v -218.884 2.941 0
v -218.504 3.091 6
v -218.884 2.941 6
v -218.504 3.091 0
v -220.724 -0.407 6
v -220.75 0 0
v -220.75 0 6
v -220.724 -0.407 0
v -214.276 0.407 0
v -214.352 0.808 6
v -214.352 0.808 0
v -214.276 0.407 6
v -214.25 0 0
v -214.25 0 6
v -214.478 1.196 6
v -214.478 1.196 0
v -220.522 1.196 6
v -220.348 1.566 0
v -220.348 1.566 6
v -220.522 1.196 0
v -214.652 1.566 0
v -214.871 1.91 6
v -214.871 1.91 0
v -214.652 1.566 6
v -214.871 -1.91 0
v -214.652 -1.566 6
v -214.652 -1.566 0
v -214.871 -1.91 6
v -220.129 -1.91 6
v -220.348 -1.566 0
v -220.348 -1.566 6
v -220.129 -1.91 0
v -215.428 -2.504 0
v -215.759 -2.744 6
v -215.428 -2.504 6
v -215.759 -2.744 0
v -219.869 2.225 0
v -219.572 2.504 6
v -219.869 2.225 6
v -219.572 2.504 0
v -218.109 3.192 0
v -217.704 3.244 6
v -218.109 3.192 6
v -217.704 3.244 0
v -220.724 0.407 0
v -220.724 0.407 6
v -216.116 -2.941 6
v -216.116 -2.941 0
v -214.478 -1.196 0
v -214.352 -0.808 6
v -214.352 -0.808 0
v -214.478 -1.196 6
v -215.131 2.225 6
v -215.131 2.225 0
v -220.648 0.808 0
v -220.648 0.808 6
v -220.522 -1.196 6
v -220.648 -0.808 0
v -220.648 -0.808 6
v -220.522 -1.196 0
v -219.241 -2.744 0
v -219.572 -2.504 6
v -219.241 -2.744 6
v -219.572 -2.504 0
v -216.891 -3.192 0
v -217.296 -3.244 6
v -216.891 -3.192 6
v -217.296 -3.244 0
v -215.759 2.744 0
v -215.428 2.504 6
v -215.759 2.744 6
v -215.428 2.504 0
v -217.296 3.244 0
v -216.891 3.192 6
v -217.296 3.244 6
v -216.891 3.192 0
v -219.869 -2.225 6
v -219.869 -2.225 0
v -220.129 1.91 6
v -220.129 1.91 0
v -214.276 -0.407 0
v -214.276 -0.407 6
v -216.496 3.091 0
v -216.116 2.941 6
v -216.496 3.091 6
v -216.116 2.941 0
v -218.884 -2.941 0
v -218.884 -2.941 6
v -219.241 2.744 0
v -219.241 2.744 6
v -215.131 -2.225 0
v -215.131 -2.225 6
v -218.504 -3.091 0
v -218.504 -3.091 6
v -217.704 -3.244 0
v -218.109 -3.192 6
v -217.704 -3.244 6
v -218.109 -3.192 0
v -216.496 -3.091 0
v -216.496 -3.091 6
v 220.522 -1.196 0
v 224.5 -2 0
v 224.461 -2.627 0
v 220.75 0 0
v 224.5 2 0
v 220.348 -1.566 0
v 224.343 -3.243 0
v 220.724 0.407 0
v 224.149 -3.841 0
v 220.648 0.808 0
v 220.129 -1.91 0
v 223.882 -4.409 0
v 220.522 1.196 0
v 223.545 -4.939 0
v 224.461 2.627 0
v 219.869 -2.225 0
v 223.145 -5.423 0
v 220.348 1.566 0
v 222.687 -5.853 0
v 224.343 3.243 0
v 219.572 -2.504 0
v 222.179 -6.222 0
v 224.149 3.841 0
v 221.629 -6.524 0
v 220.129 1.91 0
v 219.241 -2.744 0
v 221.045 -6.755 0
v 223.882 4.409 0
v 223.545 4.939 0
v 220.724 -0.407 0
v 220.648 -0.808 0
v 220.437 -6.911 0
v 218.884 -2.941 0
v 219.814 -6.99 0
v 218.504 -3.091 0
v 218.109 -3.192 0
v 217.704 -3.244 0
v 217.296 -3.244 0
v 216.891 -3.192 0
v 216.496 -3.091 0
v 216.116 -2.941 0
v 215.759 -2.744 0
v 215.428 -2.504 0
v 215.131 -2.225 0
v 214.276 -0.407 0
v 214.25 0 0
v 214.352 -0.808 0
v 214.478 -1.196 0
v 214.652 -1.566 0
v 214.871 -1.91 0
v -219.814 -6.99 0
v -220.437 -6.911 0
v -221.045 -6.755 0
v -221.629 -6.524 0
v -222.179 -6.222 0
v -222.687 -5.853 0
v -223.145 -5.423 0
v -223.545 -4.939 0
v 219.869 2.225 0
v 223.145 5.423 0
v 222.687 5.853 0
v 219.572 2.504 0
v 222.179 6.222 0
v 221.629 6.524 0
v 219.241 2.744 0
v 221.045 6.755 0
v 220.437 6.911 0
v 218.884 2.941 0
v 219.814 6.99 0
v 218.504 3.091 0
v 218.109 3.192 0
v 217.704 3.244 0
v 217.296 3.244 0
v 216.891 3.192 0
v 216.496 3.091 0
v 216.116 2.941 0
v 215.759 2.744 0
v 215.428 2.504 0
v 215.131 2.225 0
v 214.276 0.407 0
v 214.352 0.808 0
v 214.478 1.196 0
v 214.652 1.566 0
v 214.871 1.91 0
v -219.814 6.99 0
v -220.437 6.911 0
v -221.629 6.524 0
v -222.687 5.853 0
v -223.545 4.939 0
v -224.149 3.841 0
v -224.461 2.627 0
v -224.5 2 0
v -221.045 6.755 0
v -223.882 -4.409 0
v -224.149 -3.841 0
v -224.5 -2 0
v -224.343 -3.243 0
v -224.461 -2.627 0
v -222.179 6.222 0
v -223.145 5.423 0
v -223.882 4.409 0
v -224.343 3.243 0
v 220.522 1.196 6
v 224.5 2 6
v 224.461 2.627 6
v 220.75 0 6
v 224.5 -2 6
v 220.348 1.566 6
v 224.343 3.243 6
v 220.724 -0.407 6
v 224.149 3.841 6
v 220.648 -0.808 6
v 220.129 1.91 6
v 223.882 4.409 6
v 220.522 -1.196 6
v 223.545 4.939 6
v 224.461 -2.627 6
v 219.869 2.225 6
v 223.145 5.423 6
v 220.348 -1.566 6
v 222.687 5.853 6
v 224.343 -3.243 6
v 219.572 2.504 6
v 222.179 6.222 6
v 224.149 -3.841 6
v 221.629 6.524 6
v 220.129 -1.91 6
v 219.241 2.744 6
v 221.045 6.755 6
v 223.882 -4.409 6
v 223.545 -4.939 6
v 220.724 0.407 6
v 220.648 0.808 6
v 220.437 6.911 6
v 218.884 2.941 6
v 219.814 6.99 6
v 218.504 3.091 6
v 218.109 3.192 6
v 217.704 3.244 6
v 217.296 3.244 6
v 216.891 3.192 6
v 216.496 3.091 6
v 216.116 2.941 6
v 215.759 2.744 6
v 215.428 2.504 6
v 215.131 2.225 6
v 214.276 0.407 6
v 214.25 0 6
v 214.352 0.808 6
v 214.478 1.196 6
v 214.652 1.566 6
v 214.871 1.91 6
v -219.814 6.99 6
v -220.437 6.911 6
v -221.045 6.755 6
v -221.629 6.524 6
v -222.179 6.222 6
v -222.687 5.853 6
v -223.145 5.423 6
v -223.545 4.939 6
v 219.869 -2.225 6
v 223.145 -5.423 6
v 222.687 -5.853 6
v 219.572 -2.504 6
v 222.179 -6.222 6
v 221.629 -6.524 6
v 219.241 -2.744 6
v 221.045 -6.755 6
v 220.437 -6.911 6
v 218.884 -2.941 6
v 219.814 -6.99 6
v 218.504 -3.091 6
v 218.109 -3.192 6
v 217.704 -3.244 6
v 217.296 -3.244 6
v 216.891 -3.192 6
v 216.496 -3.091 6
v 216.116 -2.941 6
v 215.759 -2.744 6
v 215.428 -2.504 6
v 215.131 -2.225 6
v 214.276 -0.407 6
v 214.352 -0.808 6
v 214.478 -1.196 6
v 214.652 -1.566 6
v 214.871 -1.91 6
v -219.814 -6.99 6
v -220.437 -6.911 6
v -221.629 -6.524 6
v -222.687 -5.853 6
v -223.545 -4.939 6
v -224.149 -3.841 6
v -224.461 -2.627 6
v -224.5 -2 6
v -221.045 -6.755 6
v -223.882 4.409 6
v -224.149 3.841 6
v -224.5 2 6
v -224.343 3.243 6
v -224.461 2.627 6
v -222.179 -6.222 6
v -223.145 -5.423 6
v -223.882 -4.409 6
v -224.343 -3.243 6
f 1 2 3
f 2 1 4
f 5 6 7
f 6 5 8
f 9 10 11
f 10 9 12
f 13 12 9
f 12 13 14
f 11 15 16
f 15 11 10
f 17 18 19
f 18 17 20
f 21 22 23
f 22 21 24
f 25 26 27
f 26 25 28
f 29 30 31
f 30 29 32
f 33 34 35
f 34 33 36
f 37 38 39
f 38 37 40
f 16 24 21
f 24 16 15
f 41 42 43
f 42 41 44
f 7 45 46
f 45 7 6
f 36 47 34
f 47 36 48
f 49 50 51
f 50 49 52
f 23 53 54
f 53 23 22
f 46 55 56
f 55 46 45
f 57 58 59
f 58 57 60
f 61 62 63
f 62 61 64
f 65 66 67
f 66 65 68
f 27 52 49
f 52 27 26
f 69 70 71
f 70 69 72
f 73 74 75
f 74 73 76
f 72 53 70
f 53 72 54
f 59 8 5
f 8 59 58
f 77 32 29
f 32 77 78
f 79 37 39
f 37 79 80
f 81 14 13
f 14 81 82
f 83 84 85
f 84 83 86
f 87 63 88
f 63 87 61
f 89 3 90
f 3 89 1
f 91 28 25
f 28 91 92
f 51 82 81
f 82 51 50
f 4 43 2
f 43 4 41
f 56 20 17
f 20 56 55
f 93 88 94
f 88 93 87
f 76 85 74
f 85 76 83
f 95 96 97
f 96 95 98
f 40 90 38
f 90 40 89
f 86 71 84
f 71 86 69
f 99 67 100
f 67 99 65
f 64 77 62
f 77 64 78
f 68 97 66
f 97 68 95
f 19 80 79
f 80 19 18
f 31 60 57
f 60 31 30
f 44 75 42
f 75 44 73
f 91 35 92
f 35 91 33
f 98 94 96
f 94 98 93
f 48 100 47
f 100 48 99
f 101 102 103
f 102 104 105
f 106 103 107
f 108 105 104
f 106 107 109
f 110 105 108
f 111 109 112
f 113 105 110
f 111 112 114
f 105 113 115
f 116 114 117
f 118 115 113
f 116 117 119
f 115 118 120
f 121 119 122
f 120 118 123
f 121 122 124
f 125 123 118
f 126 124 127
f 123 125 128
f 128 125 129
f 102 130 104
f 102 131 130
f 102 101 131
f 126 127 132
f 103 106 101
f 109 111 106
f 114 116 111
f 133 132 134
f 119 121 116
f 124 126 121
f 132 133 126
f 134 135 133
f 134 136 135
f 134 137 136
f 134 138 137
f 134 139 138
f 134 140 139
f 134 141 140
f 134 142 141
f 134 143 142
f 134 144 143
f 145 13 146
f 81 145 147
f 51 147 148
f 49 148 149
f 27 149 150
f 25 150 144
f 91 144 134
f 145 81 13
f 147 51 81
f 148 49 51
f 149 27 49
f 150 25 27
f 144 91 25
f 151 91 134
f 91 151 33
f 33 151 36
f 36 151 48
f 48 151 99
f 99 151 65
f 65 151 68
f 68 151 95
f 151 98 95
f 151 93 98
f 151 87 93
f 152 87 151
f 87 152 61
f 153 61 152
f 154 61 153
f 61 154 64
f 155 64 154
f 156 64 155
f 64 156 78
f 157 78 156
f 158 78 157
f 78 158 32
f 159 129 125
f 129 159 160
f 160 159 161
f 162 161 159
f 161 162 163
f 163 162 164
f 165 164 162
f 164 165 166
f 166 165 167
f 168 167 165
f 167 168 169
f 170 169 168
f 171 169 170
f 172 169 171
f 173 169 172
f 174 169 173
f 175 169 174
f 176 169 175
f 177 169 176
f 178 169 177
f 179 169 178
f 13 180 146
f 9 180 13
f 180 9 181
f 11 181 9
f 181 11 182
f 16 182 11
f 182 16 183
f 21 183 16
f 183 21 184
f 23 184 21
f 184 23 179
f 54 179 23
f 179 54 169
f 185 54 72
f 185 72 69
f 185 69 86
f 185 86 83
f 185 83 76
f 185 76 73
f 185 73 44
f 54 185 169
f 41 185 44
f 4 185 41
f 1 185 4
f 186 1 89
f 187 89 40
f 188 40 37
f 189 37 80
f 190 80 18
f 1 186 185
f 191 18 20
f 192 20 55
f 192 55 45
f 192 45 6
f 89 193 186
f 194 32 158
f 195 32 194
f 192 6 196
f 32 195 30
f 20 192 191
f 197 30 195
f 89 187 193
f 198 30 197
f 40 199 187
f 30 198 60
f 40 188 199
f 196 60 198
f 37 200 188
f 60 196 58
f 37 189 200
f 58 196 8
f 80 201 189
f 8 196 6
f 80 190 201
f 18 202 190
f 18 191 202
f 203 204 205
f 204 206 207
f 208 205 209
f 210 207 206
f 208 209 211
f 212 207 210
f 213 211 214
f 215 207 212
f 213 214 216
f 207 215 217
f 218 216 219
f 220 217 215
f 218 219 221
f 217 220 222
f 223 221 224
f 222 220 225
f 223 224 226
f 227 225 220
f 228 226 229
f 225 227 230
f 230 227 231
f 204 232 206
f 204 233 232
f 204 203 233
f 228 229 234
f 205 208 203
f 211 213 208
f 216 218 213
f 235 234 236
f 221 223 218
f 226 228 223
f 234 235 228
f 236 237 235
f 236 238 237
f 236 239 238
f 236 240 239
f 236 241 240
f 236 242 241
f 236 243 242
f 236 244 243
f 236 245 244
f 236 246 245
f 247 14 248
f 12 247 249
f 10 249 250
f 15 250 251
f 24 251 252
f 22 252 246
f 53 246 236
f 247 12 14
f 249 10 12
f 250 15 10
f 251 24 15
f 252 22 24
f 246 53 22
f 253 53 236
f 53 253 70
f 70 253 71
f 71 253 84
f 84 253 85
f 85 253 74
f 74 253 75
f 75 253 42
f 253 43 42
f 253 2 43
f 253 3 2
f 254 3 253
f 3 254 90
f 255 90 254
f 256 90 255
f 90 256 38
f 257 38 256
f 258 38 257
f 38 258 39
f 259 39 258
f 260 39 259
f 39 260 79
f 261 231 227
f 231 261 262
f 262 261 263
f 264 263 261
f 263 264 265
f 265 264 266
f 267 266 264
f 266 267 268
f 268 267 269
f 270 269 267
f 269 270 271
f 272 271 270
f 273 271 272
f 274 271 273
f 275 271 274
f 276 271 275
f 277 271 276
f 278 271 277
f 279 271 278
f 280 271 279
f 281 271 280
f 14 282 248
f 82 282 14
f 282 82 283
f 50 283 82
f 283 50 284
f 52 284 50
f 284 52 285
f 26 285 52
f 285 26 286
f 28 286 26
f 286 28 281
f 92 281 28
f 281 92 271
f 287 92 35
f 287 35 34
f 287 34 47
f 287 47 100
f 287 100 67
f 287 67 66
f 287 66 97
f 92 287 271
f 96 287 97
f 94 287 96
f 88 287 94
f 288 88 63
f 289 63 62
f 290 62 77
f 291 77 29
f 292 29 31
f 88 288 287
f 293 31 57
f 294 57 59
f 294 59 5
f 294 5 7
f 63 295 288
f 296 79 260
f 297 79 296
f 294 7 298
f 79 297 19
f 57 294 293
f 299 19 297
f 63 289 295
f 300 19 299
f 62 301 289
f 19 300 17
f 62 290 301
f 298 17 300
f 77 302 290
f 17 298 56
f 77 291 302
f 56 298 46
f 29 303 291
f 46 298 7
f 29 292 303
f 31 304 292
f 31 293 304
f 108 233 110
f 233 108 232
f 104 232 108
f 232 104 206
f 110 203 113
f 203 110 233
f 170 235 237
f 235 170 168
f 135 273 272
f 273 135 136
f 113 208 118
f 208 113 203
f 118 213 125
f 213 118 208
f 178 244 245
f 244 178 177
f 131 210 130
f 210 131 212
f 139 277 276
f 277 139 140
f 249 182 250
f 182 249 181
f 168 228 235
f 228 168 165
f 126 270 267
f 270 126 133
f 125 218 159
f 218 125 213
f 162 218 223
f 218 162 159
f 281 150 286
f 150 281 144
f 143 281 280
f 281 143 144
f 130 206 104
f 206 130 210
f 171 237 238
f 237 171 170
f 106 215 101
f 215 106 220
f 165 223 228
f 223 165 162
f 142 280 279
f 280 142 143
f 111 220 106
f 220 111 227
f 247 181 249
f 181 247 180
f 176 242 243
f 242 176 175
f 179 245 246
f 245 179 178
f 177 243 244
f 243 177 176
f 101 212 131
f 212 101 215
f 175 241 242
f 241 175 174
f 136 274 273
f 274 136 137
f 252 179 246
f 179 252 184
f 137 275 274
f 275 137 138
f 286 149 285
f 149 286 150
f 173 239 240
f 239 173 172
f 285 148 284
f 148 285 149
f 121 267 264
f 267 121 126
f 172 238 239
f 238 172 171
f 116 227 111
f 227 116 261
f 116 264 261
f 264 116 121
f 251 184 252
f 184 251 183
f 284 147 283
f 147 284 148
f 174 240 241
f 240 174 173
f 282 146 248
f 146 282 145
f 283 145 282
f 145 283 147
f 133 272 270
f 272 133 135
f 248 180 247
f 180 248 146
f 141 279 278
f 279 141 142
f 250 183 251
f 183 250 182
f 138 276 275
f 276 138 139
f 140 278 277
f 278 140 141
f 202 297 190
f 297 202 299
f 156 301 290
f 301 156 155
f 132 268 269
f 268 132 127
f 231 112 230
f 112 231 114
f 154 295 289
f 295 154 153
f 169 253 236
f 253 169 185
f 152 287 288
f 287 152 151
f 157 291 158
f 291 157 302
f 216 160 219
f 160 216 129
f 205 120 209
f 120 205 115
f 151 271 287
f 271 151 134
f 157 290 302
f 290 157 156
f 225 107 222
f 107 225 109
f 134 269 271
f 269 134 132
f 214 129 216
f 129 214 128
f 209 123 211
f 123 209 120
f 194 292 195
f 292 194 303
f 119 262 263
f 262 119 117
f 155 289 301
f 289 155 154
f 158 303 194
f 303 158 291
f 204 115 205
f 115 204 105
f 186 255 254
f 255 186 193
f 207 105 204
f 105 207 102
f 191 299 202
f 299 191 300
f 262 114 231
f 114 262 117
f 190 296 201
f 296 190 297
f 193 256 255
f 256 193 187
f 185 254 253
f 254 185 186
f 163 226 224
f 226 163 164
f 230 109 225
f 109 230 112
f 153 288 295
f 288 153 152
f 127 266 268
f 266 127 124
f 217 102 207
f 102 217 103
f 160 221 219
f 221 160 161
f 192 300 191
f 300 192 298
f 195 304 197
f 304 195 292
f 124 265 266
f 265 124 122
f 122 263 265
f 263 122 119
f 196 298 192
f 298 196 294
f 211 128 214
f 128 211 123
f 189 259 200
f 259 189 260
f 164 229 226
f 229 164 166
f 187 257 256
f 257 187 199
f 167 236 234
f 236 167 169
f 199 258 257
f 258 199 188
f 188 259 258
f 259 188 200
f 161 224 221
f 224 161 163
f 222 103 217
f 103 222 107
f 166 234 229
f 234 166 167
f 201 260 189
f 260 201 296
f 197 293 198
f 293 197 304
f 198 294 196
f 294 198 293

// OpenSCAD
$fn = 50;


difference() {
	union() {
		hull() {
			translate(v = [-219.5000000000, 2.0000000000, 0]) {
				cylinder(h = 6, r = 5);
			}
			translate(v = [219.5000000000, 2.0000000000, 0]) {
				cylinder(h = 6, r = 5);
			}
			translate(v = [-219.5000000000, -2.0000000000, 0]) {
				cylinder(h = 6, r = 5);
			}
			translate(v = [219.5000000000, -2.0000000000, 0]) {
				cylinder(h = 6, r = 5);
			}
		}
	}
	union() {
		translate(v = [-217.5000000000, 0.0000000000, 0]) {
			cylinder(h = 6, r = 3.2500000000);
		}
		translate(v = [217.5000000000, 0.0000000000, 0]) {
			cylinder(h = 6, r = 3.2500000000);
		}
		translate(v = [-217.5000000000, 0.0000000000, 0]) {
			cylinder(h = 6, r = 1.8000000000);
		}
		translate(v = [217.5000000000, 0.0000000000, 0]) {
			cylinder(h = 6, r = 1.8000000000);
		}
		translate(v = [-217.5000000000, 0.0000000000, 0]) {
			cylinder(h = 6, r = 1.8000000000);
		}
		translate(v = [217.5000000000, 0.0000000000, 0]) {
			cylinder(h = 6, r = 1.8000000000);
		}
		translate(v = [-217.5000000000, 0.0000000000, 0]) {
			cylinder(h = 6, r = 1.8000000000);
		}
		translate(v = [217.5000000000, 0.0000000000, 0]) {
			cylinder(h = 6, r = 1.8000000000);
		}
	}
}
